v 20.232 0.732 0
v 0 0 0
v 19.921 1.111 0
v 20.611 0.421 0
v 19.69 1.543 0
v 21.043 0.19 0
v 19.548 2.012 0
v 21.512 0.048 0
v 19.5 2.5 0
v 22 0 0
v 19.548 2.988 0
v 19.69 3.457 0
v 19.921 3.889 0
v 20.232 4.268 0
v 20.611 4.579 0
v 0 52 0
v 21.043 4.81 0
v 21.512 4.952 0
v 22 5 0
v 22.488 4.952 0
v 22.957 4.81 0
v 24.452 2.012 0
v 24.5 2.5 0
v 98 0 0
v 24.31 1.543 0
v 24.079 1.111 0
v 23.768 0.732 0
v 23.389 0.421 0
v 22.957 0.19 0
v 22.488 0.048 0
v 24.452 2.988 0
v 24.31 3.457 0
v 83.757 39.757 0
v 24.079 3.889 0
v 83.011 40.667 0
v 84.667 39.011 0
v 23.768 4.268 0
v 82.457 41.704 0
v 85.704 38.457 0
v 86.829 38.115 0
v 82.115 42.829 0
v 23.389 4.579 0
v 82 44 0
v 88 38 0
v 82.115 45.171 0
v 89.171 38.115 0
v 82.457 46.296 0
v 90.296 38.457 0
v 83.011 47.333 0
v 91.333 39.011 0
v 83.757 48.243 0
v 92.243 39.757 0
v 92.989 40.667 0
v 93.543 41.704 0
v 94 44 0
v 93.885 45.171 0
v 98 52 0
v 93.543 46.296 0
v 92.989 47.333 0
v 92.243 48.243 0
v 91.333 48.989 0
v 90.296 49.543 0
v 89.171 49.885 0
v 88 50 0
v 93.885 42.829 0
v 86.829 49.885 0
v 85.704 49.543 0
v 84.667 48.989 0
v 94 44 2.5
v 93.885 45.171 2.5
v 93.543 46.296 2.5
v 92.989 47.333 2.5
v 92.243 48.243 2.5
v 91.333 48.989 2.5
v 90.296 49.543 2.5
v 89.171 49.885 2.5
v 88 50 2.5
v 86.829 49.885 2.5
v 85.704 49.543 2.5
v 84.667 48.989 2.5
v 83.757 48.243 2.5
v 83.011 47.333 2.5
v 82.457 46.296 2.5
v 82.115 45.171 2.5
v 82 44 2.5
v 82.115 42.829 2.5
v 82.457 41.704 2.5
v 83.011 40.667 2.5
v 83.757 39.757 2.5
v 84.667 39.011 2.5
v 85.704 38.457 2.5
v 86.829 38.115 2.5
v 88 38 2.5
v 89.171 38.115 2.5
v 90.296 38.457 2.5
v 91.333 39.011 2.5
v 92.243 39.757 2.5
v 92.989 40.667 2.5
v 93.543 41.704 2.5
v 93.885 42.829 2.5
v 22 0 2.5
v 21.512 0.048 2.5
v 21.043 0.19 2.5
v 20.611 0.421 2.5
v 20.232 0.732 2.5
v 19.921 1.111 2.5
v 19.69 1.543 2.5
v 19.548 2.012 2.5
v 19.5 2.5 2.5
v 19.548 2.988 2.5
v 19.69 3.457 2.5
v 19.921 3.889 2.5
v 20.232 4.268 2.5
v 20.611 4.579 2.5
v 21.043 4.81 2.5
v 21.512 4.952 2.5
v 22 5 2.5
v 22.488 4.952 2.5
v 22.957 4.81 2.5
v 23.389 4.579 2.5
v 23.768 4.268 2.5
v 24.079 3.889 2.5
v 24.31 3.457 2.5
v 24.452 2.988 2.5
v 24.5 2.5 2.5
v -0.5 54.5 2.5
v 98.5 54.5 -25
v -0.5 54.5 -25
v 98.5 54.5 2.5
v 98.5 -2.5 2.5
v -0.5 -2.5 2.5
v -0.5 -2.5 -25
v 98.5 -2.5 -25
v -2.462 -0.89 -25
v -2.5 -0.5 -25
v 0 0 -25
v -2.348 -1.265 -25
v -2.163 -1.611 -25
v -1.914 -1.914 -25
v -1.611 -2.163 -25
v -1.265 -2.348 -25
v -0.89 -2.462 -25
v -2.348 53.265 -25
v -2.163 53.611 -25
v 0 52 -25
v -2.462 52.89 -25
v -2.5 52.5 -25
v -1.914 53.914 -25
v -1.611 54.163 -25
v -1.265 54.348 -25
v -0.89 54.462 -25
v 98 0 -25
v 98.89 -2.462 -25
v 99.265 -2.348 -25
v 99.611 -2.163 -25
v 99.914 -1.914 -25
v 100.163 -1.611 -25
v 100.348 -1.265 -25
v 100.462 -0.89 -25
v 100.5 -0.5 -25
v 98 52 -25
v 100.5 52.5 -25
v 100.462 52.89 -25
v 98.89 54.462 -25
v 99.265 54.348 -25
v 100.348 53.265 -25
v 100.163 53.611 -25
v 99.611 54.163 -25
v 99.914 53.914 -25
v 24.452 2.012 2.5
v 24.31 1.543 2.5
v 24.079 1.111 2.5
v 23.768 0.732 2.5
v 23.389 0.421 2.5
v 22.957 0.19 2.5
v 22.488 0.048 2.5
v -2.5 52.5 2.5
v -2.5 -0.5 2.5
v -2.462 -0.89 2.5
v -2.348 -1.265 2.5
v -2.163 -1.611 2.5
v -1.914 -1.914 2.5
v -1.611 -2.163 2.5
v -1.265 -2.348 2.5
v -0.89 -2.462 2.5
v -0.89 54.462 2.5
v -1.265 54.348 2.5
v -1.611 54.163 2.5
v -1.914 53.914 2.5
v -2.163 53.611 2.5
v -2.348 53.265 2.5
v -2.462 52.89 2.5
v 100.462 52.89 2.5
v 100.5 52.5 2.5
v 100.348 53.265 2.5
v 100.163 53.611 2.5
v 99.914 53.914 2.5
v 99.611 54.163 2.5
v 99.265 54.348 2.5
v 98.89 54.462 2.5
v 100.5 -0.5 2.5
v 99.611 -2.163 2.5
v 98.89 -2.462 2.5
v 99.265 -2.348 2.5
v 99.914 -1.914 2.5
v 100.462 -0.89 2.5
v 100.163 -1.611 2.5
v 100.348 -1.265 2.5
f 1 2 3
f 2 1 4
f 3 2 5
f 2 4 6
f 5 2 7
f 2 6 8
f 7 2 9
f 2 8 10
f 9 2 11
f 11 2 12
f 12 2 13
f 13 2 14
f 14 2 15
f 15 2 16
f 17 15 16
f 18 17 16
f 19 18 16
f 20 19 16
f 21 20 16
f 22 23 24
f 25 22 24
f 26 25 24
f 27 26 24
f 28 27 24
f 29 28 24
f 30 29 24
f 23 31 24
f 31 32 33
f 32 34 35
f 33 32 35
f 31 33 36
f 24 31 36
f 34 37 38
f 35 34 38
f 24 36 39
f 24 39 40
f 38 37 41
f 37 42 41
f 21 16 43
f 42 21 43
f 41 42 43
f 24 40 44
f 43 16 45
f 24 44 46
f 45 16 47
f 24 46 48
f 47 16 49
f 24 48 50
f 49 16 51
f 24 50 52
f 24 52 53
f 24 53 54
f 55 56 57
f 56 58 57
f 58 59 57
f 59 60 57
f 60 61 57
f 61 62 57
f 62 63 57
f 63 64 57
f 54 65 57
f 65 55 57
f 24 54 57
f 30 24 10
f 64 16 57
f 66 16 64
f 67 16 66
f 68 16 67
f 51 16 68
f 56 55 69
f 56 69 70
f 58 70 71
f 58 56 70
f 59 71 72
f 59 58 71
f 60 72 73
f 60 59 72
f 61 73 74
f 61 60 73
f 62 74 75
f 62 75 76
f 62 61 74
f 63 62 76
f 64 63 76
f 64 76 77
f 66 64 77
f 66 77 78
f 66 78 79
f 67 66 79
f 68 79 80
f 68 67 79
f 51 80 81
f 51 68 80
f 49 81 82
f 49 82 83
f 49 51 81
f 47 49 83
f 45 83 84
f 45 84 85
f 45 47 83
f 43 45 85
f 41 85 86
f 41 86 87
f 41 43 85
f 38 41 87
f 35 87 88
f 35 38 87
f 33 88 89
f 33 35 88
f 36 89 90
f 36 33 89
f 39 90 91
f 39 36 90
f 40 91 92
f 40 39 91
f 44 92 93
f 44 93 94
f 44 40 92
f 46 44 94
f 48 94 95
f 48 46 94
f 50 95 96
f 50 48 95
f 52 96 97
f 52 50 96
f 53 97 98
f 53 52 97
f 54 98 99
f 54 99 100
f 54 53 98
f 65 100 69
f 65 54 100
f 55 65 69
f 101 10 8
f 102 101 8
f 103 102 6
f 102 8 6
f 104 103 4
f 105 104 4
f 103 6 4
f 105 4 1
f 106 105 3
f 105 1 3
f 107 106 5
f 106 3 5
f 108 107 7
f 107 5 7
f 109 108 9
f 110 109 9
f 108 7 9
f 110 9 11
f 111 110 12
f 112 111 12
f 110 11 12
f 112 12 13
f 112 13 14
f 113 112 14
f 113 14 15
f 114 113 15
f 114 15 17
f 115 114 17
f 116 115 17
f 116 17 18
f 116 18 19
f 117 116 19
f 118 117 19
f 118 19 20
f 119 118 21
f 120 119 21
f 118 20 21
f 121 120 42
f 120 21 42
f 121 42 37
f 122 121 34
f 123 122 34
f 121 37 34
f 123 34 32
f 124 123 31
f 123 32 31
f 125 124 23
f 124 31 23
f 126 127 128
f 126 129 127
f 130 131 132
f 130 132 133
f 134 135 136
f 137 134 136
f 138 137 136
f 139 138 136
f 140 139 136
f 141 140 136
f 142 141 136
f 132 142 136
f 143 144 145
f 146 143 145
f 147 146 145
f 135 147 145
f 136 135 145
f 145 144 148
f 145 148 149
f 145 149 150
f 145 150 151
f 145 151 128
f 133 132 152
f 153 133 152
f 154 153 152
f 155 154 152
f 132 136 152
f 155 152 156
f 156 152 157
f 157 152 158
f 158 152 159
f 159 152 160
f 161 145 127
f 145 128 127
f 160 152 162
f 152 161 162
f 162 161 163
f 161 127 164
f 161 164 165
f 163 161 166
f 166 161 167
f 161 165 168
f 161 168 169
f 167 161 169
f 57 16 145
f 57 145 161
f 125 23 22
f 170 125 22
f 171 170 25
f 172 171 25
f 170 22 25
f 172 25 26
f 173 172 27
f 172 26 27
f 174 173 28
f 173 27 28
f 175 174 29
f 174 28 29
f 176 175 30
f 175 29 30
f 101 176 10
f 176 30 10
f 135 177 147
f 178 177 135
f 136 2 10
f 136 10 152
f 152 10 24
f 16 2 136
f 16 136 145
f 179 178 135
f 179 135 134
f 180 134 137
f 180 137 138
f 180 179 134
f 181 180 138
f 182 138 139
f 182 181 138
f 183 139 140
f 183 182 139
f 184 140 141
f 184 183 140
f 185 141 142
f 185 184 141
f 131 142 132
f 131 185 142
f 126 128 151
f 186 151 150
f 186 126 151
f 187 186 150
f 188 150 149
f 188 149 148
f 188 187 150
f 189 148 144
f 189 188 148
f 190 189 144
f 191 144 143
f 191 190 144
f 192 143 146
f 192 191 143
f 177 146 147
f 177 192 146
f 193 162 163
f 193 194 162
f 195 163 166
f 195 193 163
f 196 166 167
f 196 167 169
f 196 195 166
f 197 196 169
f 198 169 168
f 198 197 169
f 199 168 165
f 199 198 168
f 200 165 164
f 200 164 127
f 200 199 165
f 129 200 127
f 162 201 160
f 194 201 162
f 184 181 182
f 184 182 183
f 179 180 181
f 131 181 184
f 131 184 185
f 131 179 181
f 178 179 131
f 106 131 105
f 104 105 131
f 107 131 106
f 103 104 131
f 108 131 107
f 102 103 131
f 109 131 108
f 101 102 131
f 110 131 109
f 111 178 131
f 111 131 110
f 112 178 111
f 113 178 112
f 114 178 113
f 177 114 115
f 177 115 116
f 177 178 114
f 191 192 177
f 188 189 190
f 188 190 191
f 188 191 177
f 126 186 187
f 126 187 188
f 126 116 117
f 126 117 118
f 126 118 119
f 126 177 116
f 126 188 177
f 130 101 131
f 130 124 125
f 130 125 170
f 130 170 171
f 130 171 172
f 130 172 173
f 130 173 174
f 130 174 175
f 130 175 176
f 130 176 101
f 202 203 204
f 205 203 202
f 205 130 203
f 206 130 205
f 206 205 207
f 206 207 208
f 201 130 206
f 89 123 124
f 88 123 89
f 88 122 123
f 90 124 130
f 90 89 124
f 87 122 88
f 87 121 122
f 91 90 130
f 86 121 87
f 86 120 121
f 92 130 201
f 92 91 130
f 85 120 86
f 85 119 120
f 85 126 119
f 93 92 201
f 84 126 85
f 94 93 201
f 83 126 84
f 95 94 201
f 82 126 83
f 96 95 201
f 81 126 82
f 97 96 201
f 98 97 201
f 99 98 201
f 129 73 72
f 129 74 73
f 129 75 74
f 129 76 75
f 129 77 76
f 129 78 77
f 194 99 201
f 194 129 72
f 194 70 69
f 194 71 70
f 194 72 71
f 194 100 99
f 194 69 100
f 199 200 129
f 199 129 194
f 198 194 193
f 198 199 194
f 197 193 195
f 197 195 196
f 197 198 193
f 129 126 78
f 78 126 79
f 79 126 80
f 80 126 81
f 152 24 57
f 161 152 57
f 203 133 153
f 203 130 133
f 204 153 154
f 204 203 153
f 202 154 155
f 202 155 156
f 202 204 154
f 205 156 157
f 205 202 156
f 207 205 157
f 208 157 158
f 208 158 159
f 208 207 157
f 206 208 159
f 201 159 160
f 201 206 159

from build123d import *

# Parameters (mm, degrees)
F0_R     = 6
F1_DEPTH = 2.5
F2_W     = 98
F2_H     = 52
F3_DEPTH = 25


with BuildPart() as f1:
    # F0 (on Top) → F1 (new body)
    with BuildSketch(Plane.XY):
        with BuildLine():
            Line((98.5, 54.5), (-0.5, 54.5))
            ThreePointArc((-0.5, 54.5), (-1.9142135624, 53.9142135624), (-2.5, 52.5))
            Line((-2.5, 52.5), (-2.5, -0.5))
            ThreePointArc((-2.5, -0.5), (-1.9142135624, -1.9142135624), (-0.5, -2.5))
            Line((-0.5, -2.5), (98.5, -2.5))
            ThreePointArc((98.5, -2.5), (99.9142135624, -1.9142135624), (100.5, -0.5))
            Line((100.5, -0.5), (100.5, 52.5))
            ThreePointArc((100.5, 52.5), (99.9142135624, 53.9142135624), (98.5, 54.5))
        make_face()
        Polygon((22, 0), (0, 0), (0, 52), (98, 52), (98, 0), align=None, mode=Mode.SUBTRACT)
        Polygon((0, 52), (0, 0), (22, 0), (98, 0), (98, 52), align=None)
        with BuildLine():
            ThreePointArc((24.5, 2.5), (23.767766953, 0.732233047), (22, 0))
            ThreePointArc((22, 0), (20.232233047, 4.267766953), (24.5, 2.5))
        make_face(mode=Mode.SUBTRACT)
        with Locations((88, 44)):
            Circle(F0_R, mode=Mode.SUBTRACT)
    extrude(amount=F1_DEPTH)

    # F2 (on Top) → F3 (join)
    with BuildSketch(Plane.XY):
        with BuildLine():
            Line((98.5, 54.5), (-0.5, 54.5))
            ThreePointArc((-0.5, 54.5), (-1.9142135624, 53.9142135624), (-2.5, 52.5))
            Line((-2.5, 52.5), (-2.5, -0.5))
            ThreePointArc((-2.5, -0.5), (-1.9142135624, -1.9142135624), (-0.5, -2.5))
            Line((-0.5, -2.5), (98.5, -2.5))
            ThreePointArc((98.5, -2.5), (99.9142135624, -1.9142135624), (100.5, -0.5))
            Line((100.5, -0.5), (100.5, 52.5))
            ThreePointArc((100.5, 52.5), (99.9142135624, 53.9142135624), (98.5, 54.5))
        make_face()
        with Locations((49, 26)):
            Rectangle(F2_W, F2_H, mode=Mode.SUBTRACT)
    extrude(amount=-F3_DEPTH)


solid = f1.part
